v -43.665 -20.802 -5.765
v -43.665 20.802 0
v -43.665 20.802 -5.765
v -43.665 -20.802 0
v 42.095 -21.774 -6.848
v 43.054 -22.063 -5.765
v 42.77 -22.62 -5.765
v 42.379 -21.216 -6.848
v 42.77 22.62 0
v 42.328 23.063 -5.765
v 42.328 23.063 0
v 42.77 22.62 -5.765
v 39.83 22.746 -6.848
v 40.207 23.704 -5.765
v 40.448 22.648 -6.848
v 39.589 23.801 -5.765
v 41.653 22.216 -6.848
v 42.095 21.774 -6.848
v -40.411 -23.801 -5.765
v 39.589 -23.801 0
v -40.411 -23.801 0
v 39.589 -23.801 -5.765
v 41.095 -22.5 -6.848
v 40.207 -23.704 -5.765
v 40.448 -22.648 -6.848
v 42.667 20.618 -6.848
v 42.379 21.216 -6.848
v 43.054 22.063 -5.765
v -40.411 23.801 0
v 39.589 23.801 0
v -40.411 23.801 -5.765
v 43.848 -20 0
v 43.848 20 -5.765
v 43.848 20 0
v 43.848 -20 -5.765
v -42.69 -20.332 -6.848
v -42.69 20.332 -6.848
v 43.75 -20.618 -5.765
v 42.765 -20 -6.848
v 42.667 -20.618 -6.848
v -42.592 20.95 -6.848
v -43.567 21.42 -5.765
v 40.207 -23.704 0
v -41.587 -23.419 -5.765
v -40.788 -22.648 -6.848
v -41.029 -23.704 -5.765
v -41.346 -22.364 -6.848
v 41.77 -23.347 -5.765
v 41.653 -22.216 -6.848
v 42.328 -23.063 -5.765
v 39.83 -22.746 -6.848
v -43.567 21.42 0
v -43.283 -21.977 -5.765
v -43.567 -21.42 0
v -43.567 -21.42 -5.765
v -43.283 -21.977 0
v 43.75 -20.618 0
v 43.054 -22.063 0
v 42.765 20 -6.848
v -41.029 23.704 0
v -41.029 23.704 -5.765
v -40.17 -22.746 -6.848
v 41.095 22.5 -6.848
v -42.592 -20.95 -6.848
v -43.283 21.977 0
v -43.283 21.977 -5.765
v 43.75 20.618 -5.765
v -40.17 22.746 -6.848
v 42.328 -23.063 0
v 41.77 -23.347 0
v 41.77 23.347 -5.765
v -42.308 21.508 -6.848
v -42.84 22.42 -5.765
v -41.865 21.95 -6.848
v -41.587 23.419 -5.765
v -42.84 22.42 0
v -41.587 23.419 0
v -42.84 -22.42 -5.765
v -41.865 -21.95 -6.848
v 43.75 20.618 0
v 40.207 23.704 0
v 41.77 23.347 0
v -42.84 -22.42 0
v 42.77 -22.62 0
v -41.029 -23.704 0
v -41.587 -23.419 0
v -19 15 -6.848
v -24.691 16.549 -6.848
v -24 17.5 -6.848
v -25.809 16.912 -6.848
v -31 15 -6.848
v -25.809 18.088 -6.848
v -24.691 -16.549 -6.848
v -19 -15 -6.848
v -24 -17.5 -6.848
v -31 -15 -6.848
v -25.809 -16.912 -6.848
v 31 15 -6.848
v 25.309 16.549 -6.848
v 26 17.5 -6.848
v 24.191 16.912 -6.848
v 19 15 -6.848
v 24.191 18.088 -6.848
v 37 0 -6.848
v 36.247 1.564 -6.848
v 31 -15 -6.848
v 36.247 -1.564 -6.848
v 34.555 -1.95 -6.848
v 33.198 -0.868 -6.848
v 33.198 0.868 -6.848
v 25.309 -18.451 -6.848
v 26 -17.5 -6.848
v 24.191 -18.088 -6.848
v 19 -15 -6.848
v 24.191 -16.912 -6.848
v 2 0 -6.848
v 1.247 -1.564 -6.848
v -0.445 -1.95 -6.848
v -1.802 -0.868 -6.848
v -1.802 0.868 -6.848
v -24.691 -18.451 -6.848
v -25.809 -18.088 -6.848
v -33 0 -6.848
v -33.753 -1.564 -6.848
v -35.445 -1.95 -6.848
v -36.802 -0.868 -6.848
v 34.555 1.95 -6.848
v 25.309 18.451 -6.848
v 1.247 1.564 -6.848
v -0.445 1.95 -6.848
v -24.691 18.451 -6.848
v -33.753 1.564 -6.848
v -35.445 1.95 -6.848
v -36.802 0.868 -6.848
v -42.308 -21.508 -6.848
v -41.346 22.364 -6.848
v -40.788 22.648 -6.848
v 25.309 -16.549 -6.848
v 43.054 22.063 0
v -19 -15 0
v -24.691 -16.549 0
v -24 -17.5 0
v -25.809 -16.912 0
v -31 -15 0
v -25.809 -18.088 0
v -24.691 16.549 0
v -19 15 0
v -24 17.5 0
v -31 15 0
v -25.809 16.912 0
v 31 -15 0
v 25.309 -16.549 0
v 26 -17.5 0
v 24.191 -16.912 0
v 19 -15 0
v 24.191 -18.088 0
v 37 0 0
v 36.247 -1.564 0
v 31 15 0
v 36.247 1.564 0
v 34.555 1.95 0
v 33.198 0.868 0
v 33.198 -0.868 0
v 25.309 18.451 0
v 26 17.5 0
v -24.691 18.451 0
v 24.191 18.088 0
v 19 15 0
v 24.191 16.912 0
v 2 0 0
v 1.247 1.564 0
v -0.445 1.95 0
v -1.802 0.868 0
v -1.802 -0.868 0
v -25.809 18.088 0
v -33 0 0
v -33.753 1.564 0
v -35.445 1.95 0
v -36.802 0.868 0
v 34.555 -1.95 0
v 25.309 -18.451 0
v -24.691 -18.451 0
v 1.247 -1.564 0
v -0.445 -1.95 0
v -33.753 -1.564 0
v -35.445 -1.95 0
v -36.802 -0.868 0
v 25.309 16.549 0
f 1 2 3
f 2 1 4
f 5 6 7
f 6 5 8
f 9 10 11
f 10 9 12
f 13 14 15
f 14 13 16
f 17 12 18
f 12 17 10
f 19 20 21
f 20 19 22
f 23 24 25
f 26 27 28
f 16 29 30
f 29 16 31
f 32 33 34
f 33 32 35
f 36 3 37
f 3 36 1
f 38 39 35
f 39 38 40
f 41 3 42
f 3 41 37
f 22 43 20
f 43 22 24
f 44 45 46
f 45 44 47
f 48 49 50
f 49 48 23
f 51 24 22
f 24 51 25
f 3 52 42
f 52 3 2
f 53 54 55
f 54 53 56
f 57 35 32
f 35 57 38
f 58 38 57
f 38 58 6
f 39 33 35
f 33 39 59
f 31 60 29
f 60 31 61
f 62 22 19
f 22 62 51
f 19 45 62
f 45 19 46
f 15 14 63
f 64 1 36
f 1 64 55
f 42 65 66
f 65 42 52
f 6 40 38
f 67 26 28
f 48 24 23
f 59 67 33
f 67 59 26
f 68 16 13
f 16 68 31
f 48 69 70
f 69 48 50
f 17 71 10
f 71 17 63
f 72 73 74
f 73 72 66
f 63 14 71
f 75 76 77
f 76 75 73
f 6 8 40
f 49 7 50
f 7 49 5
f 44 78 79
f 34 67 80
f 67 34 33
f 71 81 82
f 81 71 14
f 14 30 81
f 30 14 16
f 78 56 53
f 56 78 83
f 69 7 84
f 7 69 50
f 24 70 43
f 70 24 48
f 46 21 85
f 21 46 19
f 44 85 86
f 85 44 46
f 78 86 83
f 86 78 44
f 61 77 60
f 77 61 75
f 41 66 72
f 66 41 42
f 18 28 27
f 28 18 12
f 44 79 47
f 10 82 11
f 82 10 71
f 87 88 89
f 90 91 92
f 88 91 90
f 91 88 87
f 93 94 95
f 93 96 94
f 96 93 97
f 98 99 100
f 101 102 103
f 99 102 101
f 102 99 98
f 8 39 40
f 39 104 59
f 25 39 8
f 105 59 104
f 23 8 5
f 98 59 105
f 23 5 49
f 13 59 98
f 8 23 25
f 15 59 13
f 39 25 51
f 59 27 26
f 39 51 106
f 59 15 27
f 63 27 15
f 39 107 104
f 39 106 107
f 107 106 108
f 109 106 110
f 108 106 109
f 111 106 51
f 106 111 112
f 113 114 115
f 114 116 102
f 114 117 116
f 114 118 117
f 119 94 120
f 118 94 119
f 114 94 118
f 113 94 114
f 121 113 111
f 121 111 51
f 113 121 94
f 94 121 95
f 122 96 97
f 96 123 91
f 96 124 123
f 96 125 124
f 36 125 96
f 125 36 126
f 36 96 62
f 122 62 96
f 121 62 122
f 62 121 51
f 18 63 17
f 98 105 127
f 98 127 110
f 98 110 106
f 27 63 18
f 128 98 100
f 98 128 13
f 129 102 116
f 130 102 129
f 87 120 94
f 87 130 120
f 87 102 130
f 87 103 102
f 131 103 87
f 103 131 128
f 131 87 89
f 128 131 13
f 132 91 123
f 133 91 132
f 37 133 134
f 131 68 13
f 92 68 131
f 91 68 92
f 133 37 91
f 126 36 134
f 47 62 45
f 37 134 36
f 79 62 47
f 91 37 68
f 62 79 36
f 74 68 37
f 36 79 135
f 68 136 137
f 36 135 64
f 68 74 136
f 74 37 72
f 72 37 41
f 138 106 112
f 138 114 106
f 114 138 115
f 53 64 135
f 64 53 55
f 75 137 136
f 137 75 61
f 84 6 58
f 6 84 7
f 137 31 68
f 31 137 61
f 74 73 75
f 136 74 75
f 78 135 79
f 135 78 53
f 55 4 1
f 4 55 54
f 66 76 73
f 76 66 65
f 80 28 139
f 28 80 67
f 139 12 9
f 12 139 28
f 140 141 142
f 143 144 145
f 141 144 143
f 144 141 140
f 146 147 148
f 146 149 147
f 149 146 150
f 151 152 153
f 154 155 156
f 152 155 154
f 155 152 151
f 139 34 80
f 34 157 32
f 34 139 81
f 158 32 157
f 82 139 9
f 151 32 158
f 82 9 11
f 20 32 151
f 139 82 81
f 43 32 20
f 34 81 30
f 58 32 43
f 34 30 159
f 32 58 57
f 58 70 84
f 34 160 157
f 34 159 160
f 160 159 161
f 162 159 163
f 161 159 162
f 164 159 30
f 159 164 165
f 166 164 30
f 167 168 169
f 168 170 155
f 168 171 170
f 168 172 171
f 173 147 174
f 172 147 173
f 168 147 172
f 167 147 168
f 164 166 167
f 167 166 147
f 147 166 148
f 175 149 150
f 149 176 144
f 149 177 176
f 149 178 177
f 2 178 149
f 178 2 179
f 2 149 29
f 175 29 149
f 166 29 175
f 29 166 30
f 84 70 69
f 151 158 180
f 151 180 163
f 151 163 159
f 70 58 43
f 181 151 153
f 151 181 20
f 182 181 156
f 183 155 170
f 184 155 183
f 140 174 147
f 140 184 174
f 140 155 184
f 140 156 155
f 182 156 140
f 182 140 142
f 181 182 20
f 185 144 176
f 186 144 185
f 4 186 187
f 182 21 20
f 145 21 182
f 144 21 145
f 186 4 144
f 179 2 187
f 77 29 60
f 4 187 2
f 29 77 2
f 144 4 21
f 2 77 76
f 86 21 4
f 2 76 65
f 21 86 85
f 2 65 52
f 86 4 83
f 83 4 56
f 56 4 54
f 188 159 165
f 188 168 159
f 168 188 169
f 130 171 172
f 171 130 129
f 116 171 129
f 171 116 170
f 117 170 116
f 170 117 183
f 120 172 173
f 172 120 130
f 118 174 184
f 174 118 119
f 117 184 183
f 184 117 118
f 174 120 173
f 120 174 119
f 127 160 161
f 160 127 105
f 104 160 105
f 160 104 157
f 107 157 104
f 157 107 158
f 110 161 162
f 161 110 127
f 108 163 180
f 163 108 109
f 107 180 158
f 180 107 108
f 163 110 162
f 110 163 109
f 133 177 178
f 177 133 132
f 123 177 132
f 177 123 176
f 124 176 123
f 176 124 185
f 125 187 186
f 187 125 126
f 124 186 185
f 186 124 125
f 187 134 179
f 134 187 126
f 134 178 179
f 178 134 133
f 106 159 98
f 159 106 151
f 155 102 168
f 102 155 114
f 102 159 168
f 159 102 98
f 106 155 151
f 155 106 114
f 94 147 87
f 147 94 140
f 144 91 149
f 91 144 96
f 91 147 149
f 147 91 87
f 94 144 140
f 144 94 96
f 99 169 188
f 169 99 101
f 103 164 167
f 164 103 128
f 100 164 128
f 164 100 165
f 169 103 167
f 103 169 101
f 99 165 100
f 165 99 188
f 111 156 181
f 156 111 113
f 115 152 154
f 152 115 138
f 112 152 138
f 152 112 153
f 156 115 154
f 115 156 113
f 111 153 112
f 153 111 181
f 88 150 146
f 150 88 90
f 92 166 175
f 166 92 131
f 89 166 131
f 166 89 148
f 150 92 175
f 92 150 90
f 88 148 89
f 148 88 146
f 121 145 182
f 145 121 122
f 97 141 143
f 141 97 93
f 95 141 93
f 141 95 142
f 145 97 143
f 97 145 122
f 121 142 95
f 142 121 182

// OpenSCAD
CUBE_X = 80;
CUBE_Y = 40;
CUBE_Z = 10;

CYLINDER_D = 4;
CYLINDER_H = 1;

SPHERE_D = 4;
SPHERE_H = 4;


difference(){
  minkowski(){
 cube([CUBE_X,CUBE_Y,10],center=true);
 cylinder(d=CYLINDER_D,h=CYLINDER_H, $fn = 20);
 sphere(d = SPHERE_D, h = SPHERE_H, center = true);
 
}  
   translate([0,0,5]) 
    cube([88,48,10],center=true);
   cylinder(d = 4, h= 14, center= true);

    translate([35,0,0])
    cylinder(d = 4, h= 14, center= true);
    
translate([-35,0,0])
    cylinder(d = 4, h= 14, center= true);
translate([25,0,-5])
cube([12,30,40],center=true);
translate([-25,0,-5])
cube([12,30,40],center = true);
translate([25,15+2.5,0])
cylinder(d=2,h=15,center = true);
translate([25,-15-2.5,0])
cylinder(d=2,h=15,center = true);
translate([-25,15+2.5,0])
cylinder(d=2,h=15,center = true);
translate([-25,-15-2.5,0])
cylinder(d=2,h=15,center = true);
}
